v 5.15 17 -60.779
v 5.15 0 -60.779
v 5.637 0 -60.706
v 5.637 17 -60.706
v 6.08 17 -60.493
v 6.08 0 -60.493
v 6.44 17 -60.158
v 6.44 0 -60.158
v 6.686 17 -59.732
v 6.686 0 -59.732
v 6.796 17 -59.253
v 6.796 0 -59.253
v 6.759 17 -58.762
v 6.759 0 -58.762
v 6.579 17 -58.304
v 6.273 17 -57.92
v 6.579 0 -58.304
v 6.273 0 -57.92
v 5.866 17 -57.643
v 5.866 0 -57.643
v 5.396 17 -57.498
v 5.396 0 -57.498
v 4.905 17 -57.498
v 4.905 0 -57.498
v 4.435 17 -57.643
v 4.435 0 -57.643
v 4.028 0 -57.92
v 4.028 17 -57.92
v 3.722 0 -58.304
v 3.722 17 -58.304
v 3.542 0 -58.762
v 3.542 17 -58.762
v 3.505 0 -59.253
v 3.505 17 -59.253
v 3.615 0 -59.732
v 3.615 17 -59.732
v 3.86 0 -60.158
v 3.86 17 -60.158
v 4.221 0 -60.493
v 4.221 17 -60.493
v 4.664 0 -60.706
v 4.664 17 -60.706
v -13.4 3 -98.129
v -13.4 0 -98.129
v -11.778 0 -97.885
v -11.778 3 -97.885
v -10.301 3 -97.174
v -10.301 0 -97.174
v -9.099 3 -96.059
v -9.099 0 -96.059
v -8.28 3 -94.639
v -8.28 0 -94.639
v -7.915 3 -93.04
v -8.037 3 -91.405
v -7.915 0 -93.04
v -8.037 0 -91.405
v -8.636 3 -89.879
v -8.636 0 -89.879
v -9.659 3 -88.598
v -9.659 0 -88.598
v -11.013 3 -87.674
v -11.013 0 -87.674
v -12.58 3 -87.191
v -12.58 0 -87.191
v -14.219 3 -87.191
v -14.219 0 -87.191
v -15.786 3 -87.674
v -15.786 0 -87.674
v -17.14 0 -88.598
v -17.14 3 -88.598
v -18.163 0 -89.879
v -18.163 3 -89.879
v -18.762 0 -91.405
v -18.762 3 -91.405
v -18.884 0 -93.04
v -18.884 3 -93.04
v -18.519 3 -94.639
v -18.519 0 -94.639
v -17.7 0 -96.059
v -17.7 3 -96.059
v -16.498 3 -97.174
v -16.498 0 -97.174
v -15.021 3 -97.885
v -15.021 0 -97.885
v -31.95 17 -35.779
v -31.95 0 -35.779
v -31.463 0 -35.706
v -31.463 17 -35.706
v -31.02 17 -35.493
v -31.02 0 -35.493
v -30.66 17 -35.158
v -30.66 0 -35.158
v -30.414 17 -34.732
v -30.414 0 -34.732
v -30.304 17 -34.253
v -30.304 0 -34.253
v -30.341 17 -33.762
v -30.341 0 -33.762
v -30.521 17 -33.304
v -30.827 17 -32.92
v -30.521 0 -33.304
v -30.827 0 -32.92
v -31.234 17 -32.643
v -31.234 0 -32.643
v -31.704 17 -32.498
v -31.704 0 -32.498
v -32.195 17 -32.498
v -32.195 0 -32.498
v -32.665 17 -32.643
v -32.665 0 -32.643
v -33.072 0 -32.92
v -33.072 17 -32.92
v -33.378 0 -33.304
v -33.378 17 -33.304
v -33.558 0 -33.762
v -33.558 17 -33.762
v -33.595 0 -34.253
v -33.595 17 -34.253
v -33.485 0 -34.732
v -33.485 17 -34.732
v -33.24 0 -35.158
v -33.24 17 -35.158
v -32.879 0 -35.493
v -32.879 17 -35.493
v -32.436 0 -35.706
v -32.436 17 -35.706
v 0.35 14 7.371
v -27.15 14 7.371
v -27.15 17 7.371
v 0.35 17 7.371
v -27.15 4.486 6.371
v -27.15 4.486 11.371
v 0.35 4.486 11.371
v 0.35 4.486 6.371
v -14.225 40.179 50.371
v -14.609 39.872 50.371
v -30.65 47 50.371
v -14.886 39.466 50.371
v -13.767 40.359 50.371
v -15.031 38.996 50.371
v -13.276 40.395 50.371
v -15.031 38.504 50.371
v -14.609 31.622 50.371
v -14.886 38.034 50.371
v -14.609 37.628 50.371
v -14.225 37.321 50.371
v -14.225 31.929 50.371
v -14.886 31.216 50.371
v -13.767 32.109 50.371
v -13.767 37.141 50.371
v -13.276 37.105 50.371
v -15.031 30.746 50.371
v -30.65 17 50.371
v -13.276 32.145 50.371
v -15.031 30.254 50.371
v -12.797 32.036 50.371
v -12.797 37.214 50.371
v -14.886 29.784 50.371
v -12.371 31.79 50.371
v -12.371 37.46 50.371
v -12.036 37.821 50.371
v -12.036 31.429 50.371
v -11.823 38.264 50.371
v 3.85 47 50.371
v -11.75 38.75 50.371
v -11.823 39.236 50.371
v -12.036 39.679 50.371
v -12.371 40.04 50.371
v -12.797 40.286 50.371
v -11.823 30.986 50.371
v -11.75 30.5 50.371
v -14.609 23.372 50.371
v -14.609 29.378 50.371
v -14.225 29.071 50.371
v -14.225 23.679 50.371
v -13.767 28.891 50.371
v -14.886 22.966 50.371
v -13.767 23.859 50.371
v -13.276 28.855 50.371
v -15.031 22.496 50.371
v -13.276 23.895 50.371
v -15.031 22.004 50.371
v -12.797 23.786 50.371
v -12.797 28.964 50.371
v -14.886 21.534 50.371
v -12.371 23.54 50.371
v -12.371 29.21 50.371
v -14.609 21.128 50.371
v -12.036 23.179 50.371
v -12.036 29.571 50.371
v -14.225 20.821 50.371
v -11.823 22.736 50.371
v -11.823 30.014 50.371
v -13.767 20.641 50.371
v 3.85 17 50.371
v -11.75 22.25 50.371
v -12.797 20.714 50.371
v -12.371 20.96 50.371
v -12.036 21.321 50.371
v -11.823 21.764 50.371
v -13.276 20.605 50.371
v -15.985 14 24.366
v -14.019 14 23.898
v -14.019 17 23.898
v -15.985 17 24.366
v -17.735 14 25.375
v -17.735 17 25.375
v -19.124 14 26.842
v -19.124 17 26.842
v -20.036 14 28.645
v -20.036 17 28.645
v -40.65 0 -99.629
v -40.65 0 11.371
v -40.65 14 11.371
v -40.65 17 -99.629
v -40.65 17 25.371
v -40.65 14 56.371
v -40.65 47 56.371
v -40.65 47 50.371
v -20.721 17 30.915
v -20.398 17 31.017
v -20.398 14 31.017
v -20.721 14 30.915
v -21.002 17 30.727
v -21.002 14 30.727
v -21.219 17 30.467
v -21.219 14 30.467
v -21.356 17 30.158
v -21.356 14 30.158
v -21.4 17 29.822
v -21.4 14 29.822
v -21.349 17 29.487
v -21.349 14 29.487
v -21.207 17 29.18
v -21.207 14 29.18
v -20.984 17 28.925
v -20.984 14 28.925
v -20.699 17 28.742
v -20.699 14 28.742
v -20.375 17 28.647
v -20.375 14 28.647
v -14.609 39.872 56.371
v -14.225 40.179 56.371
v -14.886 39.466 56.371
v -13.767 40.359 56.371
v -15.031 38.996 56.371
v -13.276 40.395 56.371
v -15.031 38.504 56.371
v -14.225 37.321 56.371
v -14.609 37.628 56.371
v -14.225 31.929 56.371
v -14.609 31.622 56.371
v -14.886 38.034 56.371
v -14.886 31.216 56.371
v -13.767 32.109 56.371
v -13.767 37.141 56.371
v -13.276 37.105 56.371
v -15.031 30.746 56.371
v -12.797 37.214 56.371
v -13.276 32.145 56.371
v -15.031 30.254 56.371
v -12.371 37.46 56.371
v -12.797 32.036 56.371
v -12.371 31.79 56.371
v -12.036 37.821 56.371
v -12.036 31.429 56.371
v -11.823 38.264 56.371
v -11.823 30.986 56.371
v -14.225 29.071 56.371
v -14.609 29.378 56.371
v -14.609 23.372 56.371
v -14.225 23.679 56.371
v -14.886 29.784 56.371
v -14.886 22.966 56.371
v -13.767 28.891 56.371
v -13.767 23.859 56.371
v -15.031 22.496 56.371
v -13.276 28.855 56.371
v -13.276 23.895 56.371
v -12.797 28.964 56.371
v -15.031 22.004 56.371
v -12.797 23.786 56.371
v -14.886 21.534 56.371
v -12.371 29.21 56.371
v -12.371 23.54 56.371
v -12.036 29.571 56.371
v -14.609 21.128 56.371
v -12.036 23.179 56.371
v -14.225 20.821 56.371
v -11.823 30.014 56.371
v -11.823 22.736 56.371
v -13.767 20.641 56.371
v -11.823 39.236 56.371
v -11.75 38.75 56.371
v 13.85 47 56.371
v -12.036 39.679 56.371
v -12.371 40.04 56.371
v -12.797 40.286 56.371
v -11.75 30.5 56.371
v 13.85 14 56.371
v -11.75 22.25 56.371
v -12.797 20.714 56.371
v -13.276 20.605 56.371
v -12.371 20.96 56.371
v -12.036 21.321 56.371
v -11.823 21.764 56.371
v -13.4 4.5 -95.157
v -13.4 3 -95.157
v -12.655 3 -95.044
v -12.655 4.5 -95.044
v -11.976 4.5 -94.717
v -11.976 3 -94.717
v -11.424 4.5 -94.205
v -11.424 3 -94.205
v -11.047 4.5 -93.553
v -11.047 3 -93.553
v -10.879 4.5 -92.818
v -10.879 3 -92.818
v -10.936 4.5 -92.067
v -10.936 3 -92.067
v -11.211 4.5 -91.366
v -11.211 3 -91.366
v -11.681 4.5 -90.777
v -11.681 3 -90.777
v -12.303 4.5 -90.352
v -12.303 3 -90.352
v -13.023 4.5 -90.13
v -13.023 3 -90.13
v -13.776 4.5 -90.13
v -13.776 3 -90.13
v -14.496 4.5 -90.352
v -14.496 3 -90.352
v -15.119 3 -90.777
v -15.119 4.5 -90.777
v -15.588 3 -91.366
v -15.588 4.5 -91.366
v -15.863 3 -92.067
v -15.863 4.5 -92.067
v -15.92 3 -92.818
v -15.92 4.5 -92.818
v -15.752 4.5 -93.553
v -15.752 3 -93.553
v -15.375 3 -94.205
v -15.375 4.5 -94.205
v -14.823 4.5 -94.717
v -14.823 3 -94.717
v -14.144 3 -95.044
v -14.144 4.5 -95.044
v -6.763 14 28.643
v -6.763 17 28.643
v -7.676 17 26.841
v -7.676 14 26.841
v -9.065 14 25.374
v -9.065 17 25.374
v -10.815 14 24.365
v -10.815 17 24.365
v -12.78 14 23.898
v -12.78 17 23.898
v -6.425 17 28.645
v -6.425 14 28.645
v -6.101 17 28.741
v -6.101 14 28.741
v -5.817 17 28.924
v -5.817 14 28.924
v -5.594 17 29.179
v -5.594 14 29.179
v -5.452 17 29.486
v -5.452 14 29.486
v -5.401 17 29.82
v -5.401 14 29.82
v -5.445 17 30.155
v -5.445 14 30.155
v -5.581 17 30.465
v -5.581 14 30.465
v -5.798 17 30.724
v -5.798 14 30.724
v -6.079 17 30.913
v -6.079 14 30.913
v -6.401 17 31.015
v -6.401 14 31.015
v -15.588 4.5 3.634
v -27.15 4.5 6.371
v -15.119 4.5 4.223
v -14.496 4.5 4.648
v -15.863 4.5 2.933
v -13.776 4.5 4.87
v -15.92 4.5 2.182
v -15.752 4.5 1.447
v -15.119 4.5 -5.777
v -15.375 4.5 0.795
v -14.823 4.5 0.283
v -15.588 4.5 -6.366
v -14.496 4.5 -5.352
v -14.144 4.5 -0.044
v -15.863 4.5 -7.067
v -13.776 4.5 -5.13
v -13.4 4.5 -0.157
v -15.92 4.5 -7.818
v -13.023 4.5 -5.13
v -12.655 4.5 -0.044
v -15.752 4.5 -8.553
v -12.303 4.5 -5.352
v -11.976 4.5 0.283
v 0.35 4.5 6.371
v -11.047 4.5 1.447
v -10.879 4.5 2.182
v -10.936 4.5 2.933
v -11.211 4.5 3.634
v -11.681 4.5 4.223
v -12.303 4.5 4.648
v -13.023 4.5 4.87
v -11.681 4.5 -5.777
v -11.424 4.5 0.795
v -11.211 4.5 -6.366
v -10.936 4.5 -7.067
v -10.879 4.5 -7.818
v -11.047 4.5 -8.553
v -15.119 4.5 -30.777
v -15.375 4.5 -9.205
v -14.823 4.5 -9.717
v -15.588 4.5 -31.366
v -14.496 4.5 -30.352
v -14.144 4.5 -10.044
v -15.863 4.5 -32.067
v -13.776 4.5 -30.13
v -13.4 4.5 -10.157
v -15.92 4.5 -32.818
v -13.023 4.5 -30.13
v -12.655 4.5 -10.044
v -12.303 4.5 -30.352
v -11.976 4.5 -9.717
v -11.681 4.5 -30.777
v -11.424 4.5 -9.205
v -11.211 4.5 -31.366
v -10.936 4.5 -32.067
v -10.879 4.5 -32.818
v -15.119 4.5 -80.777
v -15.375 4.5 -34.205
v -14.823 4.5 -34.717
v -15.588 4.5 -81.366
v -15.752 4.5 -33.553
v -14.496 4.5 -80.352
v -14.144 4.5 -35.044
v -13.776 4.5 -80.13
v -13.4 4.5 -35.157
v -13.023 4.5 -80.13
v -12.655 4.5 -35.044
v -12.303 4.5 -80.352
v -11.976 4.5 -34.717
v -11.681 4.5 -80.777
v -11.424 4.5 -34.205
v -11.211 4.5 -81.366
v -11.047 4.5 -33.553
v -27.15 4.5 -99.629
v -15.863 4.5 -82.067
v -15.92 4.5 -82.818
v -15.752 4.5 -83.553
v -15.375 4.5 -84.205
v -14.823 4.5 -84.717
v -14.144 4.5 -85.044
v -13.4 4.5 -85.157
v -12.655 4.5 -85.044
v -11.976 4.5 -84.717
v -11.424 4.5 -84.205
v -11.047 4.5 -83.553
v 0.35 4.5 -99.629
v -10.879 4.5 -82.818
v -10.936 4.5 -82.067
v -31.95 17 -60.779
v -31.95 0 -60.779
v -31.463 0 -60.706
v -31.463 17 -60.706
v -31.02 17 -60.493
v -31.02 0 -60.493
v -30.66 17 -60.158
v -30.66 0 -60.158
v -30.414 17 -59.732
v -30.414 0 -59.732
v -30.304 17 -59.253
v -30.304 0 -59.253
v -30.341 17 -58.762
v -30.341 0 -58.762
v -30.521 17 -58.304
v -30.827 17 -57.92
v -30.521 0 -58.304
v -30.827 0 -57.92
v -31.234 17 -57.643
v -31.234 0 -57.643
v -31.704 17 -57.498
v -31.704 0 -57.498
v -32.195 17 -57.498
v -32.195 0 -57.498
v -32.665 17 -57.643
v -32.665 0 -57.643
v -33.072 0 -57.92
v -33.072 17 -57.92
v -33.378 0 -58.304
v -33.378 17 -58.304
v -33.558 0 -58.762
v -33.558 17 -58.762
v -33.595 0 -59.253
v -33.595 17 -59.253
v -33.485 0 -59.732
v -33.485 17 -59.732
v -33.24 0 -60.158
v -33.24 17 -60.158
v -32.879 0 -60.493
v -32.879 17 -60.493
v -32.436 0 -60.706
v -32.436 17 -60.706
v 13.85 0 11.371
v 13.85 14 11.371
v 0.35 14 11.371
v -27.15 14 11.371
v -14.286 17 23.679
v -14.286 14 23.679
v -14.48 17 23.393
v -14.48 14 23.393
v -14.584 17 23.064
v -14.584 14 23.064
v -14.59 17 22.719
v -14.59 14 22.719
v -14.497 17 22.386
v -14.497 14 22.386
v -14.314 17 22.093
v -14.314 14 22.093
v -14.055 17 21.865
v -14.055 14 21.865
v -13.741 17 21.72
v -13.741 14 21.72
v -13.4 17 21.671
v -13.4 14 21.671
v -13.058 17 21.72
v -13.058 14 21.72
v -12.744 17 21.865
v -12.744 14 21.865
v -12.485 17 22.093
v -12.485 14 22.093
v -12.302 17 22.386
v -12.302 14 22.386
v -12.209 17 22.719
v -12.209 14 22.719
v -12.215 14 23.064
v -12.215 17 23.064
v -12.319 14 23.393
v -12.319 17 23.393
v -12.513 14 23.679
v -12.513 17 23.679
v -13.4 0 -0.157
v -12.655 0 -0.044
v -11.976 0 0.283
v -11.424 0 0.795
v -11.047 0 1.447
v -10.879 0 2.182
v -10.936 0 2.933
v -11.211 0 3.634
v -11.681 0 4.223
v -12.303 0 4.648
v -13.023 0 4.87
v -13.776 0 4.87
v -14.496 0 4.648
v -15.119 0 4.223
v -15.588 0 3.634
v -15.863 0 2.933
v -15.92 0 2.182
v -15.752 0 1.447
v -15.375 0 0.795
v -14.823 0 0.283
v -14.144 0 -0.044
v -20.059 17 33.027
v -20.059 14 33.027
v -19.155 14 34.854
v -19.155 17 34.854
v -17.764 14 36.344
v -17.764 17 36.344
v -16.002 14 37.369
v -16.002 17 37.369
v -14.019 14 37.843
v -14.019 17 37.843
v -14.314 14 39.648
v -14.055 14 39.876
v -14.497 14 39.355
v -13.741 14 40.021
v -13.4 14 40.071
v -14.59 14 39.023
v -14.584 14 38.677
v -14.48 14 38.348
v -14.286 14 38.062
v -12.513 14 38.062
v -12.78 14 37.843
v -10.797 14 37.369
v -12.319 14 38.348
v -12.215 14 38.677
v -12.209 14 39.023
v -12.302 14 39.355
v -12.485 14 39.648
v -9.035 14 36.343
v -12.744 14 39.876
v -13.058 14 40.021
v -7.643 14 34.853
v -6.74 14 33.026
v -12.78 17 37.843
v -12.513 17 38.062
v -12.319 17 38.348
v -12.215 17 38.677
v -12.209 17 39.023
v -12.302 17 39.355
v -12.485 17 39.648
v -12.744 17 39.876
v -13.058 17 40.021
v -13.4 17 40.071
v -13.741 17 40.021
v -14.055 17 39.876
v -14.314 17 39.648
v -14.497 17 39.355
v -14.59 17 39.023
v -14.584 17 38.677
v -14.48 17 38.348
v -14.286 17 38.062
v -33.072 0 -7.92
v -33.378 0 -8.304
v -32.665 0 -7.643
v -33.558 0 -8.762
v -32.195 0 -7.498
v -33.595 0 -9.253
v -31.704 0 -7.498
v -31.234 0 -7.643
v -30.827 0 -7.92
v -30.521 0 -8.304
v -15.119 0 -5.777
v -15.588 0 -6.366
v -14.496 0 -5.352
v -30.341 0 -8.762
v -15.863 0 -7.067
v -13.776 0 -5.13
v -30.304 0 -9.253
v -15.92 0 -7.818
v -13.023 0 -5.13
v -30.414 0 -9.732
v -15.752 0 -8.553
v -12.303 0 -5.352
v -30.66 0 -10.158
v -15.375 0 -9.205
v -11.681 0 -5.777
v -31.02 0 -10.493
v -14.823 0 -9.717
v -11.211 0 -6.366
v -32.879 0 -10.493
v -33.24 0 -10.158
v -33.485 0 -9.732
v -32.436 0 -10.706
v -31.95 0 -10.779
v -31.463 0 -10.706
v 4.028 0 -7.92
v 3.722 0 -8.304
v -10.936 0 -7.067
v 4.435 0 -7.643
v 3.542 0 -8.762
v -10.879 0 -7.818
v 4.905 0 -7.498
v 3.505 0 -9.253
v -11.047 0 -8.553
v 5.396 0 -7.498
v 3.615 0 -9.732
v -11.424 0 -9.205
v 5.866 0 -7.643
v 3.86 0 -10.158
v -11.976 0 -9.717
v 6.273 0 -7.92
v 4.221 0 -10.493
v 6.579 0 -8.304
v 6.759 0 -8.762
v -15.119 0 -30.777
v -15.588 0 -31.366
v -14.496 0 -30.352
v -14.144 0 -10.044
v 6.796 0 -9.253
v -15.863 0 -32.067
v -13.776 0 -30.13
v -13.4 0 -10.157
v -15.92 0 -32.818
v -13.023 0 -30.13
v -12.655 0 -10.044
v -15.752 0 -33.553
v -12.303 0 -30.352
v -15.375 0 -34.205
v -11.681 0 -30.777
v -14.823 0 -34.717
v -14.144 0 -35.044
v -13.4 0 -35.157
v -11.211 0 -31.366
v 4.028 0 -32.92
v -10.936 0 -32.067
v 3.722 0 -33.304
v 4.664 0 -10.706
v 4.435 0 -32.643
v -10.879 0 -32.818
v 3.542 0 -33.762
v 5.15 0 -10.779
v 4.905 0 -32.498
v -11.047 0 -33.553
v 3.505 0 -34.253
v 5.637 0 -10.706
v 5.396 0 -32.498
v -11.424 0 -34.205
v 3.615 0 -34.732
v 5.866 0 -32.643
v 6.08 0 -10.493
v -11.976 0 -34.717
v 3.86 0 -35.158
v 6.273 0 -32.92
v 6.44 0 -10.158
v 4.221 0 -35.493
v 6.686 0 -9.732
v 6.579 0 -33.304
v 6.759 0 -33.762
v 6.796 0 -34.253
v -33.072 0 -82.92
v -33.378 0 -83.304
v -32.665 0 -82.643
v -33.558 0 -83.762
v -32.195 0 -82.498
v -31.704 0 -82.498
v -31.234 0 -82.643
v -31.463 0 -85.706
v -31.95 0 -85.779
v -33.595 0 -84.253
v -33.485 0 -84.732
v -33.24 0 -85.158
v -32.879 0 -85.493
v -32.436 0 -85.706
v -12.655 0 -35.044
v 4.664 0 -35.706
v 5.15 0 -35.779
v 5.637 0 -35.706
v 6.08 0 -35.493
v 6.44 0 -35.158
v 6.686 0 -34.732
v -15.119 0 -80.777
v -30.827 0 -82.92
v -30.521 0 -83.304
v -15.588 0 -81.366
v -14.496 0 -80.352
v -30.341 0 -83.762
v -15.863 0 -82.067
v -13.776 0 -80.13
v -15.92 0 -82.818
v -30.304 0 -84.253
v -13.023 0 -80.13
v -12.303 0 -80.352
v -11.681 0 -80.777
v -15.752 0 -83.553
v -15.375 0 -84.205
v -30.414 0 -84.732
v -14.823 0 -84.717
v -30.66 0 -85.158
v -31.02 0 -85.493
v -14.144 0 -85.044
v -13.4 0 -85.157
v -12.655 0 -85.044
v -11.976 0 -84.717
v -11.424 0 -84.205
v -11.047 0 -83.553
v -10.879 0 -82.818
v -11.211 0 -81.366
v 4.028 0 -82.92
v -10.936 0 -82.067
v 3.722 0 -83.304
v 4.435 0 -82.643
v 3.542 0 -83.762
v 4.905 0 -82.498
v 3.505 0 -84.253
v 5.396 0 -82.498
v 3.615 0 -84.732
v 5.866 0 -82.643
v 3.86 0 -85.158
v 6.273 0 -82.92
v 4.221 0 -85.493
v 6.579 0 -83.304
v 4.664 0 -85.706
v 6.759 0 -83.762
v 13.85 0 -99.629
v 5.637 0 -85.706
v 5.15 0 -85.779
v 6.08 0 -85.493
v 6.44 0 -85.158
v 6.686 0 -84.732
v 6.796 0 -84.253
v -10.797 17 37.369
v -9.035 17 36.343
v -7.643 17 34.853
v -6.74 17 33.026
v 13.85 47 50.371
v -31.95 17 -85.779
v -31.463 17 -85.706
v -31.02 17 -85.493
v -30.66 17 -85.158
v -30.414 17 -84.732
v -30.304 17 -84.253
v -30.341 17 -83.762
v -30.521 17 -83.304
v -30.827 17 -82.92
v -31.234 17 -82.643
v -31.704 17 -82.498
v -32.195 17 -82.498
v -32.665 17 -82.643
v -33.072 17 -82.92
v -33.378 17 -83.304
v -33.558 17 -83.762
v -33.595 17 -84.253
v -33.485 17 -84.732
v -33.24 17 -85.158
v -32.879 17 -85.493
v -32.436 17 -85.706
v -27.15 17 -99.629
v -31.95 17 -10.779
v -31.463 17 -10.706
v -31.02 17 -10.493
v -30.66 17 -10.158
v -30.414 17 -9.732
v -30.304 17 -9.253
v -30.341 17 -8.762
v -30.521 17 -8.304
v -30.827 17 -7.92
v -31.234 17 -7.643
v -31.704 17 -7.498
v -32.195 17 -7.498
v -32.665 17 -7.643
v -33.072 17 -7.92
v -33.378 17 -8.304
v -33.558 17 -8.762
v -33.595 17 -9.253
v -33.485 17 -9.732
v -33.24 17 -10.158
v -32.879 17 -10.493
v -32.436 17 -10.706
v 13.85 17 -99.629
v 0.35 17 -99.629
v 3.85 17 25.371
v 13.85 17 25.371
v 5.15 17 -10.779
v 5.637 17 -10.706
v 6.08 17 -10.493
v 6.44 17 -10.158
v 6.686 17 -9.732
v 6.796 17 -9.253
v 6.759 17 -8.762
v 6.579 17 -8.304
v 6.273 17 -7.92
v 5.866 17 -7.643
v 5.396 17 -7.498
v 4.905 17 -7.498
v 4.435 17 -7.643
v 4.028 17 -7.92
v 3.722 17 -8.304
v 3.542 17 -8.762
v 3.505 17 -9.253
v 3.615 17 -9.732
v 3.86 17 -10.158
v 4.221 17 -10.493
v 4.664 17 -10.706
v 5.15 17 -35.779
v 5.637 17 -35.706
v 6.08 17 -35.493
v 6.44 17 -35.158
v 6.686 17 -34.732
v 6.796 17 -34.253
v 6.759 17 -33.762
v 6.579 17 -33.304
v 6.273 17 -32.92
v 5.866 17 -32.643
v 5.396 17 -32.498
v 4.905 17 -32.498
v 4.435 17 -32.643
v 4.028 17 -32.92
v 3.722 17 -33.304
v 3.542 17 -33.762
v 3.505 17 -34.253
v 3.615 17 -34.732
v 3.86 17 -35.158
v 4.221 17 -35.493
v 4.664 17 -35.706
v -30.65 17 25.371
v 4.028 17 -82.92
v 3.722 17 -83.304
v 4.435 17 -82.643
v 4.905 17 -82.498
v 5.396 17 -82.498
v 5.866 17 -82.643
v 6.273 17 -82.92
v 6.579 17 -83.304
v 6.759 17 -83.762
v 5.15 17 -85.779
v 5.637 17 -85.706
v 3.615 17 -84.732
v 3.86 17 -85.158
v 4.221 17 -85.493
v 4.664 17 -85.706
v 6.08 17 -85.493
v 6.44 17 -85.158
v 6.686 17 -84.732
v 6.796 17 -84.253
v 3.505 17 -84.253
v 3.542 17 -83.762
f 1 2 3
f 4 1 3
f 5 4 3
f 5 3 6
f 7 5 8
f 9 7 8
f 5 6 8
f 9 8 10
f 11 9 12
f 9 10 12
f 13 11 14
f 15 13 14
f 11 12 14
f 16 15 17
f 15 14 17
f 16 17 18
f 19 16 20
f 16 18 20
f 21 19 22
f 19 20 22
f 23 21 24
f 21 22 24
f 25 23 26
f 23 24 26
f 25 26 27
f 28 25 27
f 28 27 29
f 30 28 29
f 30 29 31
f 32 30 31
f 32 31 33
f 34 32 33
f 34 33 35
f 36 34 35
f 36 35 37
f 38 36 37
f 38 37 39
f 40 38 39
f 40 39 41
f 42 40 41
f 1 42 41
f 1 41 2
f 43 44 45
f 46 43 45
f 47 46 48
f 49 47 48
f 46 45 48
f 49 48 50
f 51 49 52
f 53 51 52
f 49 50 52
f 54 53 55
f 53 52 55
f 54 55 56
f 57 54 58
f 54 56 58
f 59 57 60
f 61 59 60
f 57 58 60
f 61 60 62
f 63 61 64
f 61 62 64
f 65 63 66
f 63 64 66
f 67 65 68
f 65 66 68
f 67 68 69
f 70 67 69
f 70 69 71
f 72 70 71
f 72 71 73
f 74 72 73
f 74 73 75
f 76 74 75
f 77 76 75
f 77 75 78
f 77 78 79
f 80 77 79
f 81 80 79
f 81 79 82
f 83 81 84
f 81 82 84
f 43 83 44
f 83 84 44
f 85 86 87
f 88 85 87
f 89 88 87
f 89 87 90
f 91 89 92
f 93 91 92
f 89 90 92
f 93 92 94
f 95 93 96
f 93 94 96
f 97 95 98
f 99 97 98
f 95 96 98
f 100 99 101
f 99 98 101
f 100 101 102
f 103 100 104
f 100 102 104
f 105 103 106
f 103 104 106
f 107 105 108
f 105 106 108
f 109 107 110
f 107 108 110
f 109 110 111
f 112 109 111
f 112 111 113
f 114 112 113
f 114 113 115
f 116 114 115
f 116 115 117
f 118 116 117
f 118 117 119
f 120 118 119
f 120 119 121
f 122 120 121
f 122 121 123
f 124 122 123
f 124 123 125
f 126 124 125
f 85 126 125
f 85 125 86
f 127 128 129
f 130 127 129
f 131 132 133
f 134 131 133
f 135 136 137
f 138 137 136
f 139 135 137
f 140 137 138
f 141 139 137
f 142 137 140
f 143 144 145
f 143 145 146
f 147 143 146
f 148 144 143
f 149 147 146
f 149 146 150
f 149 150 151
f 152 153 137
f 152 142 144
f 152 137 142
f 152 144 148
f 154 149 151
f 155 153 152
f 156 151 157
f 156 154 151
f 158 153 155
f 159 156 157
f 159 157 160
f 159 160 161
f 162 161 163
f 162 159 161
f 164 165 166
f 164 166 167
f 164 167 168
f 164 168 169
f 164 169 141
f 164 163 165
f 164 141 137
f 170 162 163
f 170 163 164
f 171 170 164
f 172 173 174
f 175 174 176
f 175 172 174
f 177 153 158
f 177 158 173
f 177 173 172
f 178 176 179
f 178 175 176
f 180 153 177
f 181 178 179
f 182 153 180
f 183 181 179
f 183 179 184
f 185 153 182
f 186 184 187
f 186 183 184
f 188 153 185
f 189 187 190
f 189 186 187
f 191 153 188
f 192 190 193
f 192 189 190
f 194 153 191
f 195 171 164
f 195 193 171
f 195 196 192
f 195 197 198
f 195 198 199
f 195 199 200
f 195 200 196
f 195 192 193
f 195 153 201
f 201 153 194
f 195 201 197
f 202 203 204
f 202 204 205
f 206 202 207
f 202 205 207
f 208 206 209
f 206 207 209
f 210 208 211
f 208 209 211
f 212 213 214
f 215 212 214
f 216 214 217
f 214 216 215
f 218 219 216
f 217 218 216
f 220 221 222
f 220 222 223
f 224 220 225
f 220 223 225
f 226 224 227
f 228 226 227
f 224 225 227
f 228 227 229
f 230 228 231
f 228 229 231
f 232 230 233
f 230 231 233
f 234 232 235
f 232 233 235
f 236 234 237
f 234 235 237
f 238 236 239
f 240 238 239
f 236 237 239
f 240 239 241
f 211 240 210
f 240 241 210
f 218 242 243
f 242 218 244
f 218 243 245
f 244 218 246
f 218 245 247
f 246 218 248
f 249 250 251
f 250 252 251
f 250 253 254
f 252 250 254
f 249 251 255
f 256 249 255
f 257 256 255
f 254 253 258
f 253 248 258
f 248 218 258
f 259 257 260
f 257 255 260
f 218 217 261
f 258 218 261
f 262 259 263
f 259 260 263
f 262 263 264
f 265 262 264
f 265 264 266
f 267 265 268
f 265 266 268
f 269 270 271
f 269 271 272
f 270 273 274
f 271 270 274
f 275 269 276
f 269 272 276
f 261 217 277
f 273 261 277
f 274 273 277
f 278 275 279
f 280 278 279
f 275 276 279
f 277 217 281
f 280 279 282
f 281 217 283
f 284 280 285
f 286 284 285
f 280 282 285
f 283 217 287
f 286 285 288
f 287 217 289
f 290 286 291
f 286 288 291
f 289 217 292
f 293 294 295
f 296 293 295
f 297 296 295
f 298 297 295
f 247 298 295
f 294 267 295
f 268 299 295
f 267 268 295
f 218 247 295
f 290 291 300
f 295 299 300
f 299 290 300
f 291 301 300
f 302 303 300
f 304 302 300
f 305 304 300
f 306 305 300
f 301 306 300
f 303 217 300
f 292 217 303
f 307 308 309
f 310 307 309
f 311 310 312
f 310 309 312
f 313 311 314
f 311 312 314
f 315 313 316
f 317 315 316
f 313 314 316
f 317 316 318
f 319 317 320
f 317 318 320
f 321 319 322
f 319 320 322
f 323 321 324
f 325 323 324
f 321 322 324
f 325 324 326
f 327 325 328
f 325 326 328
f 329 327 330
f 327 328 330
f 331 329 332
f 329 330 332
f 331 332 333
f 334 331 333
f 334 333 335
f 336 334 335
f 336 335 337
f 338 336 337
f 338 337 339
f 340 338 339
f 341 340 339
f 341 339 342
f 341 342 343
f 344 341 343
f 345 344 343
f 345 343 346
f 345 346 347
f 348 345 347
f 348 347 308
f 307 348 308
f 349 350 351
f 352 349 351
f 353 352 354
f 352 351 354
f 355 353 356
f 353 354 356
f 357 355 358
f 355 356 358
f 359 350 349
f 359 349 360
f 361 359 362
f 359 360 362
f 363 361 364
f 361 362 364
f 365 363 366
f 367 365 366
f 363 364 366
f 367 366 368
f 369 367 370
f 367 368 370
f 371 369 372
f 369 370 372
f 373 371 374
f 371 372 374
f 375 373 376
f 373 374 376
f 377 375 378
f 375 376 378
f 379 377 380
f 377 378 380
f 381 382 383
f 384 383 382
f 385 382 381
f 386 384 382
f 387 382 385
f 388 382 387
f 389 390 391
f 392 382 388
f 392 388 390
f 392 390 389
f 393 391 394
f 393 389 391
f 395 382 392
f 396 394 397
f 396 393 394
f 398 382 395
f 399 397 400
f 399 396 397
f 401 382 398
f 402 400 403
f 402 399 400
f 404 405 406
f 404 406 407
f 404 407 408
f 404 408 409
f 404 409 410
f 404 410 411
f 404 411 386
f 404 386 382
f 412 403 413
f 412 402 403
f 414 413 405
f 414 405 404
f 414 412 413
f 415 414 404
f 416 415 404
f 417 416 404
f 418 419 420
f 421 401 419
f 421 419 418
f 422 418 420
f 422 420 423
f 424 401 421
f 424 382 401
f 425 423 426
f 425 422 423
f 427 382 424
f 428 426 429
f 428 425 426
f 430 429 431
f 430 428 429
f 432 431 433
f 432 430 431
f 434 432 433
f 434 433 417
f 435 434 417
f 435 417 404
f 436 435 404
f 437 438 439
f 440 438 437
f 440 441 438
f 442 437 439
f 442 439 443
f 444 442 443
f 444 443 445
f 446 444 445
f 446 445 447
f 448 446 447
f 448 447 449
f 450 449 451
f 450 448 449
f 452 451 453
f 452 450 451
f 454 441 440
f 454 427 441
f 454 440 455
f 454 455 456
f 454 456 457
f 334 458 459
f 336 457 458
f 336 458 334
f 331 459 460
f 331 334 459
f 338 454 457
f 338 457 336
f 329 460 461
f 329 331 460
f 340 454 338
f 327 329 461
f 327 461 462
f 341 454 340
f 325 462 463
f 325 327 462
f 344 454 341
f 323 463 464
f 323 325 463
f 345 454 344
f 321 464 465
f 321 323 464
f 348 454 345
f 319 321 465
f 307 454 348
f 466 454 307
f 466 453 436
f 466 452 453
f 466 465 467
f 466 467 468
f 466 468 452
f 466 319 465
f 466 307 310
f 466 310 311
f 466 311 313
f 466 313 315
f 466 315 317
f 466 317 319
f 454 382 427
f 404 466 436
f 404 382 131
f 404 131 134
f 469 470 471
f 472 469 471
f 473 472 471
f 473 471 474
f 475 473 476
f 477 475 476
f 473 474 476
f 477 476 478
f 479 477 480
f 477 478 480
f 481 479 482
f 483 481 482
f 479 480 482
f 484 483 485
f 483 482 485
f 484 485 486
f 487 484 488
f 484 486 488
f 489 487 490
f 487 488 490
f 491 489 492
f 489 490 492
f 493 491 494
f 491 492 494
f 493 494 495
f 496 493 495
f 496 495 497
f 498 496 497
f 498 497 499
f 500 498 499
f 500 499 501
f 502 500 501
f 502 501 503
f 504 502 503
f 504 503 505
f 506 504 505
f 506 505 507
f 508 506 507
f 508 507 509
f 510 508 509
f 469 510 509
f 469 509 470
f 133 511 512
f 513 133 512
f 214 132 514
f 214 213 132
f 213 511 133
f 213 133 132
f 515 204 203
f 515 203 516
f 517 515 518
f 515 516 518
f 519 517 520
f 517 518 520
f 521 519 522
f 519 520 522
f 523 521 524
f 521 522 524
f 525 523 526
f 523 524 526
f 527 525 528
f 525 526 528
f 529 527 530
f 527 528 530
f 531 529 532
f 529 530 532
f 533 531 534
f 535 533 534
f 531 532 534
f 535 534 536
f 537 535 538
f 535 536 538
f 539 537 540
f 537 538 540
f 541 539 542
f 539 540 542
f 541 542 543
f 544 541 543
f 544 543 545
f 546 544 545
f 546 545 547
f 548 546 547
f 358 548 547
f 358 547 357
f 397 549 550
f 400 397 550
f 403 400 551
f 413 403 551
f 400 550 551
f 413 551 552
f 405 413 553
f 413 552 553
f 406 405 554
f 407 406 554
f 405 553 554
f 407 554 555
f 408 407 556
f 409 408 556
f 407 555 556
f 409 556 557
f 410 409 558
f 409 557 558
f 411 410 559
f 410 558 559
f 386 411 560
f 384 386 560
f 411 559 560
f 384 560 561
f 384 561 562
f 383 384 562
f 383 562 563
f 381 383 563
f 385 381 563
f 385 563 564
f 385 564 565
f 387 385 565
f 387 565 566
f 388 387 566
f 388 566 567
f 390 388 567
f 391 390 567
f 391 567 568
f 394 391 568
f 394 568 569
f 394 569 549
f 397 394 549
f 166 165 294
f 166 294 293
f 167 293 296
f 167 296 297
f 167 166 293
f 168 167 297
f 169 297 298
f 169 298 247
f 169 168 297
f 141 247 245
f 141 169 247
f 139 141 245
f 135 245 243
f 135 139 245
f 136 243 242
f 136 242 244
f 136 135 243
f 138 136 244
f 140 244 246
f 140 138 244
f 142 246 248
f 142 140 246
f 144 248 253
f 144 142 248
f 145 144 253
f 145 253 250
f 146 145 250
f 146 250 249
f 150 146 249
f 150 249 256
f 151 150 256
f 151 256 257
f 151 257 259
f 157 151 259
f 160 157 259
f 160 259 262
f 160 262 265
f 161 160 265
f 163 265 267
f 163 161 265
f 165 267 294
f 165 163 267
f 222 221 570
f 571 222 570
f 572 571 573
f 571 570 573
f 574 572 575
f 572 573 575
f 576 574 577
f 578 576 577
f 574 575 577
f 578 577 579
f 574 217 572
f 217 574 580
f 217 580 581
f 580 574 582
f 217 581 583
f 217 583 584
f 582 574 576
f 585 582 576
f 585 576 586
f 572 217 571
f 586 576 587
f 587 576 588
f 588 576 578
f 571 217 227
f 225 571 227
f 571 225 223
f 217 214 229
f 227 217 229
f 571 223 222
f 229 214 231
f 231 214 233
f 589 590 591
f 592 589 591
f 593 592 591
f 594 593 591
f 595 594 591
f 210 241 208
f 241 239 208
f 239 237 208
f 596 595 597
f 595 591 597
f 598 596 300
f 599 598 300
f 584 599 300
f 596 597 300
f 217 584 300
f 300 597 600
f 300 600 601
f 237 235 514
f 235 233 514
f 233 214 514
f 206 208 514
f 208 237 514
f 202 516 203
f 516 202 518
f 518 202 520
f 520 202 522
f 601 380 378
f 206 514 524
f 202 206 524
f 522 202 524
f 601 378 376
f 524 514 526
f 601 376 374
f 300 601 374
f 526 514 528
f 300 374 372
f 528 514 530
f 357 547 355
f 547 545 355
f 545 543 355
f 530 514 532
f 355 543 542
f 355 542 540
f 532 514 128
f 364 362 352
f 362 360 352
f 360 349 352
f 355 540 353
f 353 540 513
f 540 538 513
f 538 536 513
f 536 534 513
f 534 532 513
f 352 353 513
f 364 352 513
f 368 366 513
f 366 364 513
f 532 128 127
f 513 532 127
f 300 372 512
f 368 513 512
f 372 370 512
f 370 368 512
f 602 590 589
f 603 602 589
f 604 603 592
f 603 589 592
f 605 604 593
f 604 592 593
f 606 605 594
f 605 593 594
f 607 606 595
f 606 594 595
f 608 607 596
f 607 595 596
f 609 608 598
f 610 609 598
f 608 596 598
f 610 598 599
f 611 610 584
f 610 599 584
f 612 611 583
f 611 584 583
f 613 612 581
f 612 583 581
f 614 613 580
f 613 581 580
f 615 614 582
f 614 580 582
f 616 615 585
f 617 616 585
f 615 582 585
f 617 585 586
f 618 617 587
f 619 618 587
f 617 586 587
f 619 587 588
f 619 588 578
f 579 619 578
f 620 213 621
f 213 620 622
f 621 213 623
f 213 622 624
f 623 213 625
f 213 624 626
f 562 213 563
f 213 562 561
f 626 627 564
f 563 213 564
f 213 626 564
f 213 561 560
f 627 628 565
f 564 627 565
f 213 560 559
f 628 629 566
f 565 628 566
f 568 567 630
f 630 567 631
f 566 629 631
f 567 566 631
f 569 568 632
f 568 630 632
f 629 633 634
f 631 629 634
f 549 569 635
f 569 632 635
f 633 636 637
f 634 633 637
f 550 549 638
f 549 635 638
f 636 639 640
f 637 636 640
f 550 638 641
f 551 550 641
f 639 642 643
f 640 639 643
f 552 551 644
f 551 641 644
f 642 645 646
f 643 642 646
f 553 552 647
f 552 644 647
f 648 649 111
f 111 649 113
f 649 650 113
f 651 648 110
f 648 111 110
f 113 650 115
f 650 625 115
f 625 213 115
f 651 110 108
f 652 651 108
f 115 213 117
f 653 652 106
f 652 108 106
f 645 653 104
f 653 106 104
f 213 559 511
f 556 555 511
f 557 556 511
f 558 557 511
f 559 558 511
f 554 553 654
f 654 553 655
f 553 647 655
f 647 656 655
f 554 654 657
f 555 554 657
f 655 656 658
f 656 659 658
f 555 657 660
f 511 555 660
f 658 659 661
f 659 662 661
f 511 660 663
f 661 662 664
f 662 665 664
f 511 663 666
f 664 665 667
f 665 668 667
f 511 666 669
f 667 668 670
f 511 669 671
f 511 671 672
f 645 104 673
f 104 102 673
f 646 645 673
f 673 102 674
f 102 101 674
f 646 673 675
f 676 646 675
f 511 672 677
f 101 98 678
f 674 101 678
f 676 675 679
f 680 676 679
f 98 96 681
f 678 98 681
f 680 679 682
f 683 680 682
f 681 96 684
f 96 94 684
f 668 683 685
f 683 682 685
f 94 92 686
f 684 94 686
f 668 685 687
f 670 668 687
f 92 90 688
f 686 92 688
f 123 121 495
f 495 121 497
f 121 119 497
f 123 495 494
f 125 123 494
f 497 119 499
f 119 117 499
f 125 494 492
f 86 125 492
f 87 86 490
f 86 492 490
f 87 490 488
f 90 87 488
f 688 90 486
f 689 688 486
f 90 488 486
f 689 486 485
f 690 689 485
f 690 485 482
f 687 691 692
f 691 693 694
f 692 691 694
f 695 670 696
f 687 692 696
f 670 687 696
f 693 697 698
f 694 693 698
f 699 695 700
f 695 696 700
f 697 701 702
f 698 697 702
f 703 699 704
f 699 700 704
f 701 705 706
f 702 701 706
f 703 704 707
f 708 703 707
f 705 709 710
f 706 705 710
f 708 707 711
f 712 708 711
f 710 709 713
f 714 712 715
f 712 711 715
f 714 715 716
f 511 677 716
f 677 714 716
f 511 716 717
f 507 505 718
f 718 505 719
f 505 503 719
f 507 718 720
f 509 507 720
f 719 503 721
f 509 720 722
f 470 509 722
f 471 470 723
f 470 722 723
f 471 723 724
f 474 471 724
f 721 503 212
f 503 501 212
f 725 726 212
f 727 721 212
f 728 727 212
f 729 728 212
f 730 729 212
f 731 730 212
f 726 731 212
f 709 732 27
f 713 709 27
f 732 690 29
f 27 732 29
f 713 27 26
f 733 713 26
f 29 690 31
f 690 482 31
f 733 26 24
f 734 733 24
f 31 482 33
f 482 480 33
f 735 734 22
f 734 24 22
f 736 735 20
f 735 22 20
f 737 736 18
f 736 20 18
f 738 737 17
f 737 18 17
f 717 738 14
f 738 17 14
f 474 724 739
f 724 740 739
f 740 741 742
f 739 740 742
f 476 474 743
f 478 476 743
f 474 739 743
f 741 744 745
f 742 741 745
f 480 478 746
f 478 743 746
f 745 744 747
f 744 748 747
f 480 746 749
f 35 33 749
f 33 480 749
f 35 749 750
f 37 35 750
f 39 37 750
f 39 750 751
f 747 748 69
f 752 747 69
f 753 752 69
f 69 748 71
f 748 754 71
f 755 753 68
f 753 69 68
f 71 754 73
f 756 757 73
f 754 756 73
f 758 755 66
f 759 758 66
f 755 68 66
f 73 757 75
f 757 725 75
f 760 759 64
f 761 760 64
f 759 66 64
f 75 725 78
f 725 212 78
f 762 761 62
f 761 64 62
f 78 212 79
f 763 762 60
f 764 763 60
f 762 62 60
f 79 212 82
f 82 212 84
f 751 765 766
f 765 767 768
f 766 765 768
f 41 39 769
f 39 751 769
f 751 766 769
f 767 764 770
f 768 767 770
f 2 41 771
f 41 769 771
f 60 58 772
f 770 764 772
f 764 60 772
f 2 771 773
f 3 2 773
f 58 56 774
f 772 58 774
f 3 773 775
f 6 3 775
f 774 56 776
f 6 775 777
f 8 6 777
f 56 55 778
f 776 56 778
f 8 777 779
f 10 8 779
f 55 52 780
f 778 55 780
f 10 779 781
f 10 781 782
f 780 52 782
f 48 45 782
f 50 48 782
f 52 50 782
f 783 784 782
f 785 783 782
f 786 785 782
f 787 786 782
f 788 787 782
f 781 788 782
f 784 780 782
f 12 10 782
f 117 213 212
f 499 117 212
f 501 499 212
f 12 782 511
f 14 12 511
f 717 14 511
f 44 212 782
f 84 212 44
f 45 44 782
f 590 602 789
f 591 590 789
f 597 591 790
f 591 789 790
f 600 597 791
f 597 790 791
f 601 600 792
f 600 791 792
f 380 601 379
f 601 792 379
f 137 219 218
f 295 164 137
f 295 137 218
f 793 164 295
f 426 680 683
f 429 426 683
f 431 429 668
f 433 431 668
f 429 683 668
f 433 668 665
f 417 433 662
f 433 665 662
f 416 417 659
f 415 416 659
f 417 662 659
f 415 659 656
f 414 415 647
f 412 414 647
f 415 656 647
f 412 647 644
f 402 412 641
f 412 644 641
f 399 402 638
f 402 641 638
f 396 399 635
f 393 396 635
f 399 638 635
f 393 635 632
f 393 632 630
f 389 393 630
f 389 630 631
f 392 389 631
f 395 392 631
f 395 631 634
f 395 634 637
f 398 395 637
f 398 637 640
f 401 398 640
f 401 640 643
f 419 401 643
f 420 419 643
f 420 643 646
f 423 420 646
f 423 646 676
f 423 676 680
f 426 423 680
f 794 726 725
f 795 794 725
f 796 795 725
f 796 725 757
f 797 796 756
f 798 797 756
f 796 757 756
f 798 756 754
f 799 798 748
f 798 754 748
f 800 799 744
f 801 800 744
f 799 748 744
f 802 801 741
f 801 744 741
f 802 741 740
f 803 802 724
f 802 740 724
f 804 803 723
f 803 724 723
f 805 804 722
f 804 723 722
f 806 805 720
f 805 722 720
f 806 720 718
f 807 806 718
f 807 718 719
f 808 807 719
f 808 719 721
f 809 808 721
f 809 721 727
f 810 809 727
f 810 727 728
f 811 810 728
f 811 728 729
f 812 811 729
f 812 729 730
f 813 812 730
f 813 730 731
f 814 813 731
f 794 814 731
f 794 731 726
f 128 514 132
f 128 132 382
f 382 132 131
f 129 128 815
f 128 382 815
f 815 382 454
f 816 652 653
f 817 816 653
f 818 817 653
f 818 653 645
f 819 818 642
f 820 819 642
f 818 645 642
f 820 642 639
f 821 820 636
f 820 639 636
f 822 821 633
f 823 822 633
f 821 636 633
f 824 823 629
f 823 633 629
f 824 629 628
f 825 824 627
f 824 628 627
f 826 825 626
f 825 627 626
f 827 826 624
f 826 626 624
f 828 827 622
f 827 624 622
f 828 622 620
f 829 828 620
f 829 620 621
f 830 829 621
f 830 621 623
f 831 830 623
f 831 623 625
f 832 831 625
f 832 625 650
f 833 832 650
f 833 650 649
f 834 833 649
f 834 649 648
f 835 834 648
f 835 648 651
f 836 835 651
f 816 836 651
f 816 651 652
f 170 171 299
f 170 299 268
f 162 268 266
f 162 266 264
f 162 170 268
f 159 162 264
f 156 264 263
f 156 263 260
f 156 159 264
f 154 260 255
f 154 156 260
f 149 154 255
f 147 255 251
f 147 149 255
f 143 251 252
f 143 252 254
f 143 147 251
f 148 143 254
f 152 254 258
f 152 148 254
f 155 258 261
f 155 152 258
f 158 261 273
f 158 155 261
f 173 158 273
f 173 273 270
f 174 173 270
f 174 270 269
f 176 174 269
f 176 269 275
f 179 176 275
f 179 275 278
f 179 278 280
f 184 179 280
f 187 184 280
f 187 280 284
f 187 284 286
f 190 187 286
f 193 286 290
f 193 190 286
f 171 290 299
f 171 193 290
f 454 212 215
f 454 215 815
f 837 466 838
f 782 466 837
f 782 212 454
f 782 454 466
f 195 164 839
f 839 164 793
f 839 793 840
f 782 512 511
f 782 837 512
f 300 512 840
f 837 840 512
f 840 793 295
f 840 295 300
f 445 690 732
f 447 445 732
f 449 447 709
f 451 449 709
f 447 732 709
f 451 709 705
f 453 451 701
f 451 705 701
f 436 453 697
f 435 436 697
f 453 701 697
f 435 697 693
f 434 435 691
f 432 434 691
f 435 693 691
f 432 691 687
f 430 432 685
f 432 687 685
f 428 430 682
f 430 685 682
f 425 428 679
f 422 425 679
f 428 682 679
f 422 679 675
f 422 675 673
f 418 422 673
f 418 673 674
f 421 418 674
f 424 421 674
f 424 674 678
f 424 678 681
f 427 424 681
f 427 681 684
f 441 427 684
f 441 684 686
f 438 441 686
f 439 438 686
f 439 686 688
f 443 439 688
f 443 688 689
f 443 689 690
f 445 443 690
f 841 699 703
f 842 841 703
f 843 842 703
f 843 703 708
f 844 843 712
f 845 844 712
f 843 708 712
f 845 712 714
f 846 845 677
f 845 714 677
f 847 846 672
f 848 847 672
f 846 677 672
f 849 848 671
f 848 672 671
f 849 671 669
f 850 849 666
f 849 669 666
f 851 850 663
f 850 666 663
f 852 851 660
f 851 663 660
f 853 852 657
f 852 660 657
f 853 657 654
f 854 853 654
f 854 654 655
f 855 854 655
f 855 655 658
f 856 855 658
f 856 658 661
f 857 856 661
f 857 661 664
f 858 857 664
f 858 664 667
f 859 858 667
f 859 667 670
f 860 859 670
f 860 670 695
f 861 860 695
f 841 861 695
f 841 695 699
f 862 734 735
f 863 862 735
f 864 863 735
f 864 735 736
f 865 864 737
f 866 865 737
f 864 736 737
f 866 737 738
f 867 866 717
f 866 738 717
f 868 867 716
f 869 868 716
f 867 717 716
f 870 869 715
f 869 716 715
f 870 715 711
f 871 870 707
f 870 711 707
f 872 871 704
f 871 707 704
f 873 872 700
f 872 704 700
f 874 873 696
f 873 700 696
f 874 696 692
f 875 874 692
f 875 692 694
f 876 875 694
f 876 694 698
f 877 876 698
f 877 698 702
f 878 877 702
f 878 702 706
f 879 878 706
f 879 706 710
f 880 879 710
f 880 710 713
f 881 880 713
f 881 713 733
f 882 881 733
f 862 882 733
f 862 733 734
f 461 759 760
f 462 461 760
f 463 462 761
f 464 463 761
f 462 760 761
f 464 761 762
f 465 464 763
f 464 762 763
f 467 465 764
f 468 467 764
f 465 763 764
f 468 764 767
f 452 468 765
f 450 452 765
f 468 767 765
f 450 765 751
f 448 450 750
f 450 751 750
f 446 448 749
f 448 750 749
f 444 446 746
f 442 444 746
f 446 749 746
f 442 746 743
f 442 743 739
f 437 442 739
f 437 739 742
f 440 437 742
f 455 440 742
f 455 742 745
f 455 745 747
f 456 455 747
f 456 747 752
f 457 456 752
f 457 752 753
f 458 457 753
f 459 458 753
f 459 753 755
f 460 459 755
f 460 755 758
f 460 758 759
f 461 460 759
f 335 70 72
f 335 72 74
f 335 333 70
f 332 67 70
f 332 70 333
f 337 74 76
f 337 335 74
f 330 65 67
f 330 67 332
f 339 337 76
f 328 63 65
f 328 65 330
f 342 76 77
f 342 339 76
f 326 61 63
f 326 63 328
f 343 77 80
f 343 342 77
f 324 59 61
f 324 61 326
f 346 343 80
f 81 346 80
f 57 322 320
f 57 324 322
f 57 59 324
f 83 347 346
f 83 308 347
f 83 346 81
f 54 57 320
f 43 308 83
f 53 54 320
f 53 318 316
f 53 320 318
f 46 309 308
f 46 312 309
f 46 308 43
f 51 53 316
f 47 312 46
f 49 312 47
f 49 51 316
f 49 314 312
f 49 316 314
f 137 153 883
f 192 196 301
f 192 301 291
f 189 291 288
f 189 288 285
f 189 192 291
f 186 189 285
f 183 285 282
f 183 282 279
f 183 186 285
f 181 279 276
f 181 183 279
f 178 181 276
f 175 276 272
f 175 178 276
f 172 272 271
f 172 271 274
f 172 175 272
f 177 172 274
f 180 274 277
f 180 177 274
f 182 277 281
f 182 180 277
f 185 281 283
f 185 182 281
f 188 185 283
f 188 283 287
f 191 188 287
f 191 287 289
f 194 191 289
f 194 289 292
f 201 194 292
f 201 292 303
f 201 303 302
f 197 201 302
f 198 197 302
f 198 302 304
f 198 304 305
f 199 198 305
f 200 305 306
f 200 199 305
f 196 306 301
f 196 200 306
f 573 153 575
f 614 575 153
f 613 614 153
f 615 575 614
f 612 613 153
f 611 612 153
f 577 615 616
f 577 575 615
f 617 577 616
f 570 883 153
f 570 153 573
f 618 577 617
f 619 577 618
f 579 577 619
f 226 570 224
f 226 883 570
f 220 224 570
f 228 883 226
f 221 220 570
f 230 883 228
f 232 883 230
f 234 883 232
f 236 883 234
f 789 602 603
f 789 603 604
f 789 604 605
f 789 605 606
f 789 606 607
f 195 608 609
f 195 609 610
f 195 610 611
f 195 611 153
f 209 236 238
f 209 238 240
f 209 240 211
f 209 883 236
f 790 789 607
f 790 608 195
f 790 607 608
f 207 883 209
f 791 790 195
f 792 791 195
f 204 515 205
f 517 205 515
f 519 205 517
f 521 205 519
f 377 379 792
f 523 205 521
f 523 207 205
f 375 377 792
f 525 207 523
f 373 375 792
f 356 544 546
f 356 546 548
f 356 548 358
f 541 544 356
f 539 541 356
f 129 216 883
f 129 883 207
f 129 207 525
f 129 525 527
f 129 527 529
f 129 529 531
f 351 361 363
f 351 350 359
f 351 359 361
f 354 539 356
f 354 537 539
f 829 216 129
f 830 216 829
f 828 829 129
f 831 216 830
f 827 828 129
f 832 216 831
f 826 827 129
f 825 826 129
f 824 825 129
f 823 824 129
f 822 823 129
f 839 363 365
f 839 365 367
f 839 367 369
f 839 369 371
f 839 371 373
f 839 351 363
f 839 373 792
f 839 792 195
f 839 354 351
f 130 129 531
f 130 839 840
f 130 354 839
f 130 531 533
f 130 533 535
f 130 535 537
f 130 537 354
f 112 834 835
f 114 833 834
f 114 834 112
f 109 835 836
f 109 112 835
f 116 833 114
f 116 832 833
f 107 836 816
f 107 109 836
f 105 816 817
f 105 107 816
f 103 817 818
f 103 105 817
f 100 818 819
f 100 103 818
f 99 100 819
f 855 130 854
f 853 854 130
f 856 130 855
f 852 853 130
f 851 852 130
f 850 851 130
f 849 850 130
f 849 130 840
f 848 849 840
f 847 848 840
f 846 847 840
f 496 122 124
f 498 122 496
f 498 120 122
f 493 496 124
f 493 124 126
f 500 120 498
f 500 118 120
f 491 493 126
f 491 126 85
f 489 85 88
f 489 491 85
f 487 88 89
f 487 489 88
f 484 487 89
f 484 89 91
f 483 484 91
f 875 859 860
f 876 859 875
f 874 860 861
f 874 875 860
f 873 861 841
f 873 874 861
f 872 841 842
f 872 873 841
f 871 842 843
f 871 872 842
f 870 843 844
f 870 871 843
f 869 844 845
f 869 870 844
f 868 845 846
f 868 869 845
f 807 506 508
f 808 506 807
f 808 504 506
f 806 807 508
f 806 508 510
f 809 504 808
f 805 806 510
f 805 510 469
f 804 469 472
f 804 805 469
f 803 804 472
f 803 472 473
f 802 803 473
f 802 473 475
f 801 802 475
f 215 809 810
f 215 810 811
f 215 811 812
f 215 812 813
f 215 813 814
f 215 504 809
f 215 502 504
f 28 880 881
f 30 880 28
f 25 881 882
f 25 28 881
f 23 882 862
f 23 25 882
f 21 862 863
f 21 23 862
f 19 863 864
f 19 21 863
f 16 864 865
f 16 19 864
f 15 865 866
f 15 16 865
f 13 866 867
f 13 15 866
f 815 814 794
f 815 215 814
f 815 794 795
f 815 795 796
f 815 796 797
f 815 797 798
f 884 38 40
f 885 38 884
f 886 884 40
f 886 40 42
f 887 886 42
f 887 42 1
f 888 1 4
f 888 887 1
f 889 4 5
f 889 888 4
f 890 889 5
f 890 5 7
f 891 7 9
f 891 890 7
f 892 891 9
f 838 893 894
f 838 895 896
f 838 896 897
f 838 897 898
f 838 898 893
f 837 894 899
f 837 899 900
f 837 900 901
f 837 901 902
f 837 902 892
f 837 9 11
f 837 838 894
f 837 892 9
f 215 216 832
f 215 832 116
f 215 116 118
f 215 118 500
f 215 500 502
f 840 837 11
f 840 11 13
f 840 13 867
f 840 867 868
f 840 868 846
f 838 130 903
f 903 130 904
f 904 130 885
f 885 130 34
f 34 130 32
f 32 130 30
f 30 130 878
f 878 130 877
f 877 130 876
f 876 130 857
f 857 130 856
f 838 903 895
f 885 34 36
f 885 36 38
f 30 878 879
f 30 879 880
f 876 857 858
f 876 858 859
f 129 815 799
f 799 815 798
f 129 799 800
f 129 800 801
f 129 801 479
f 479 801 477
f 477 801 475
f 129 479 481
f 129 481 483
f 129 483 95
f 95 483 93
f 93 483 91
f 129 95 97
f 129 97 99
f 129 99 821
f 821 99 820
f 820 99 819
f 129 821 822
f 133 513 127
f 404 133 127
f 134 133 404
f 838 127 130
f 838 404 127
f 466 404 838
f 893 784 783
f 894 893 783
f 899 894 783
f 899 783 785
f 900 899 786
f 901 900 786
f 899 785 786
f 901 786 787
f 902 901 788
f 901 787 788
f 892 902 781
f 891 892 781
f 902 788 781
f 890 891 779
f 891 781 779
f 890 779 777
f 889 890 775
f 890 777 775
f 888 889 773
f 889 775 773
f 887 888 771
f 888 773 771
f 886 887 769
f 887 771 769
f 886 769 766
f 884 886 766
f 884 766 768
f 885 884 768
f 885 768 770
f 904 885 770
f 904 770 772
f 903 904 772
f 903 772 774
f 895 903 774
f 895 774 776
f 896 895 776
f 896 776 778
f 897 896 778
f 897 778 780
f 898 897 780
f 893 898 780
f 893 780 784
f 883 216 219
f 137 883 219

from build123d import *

# Parameters (mm, degrees)
SKETCH1_W                           = 54.5
SKETCH1_H                           = 111
BOSS_EXTRUDE1_DEPTH                 = 4.5
SKETCH2_W                           = 13.5
SKETCH2_H                           = 111
BOSS_EXTRUDE2_DEPTH                 = 12.5
M4X0_7_TAPPED_HOLE1_D               = 3.3
SKETCH6_W                           = 4
SKETCH6_H                           = 12.5
BOSS_EXTRUDE3_DEPTH                 = 37
SKETCH7_W                           = 54.5
SKETCH7_H                           = 3
BOSS_EXTRUDE5_DEPTH                 = 45
SKETCH8_R                           = 7
CUT_EXTRUDE1_DEPTH                  = 3
M2_CLEARANCE_HOLE1_D                = 2.4
F_8_0_199_DIAMETER_HOLE1_D          = 5.0546
SKETCH12_R                          = 5.5
CUT_EXTRUDE3_DEPTH                  = 3
SKETCH13_W                          = 27.5
SKETCH13_H                          = 9.513667368
CUT_EXTRUDE4_DEPTH                  = 5
SKETCH14_W                          = 54.5
SKETCH14_H                          = 6
BOSS_EXTRUDE6_DEPTH                 = 30
RIB6_REACH                          = 124.903
SKETCH20_WALL_W                     = 286.858082508
SKETCH20_WALL_H                     = 10
TAP_START                           = 50.370687416
TAP_DRILL_FOR_M4X0_7_TAP1_OUTLINE_R = 1.65
TAP_DRILL_FOR_M4X0_7_TAP1_DEPTH     = 6
TAP_START_2                         = -40.649543841
TAP_DRILL_FOR_M4X0_7_TAP1_2_DEPTH   = 10


with BuildPart() as part:
    # Sketch1 → Boss-Extrude1 (new body)
    with BuildSketch(Plane(origin=(0, 0, 0), x_dir=(1, 0, 0), z_dir=(0, 1, 0))):
        with Locations((-13.399543841, 44.129312584)):
            Rectangle(SKETCH1_W, SKETCH1_H)
    extrude(amount=BOSS_EXTRUDE1_DEPTH)

    # Sketch2 → Boss-Extrude2 (add)
    with BuildSketch(Plane(origin=(0, 4.5, 0), x_dir=(1, 0, 0), z_dir=(0, 1, 0))):
        with Locations((7.100456159, 44.129312584)):
            Rectangle(SKETCH2_W, SKETCH2_H)
        with Locations((-33.899543841, 44.129312584)):
            Rectangle(SKETCH2_W, SKETCH2_H)
    extrude(amount=BOSS_EXTRUDE2_DEPTH)

    # M4x0.7 Tapped Hole1 (through all)
    with Locations(Plane(origin=(-31.949543841, 17, -9.129312584), x_dir=(0, 0, 1), z_dir=(0, 1, 0))):
        with Locations((0, 0), (-25, 0), (-50, 0), (-75, 0), (0, 37.1), (-25, 37.1), (-50, 37.1), (-75, 37.1)):
            Hole(M4X0_7_TAPPED_HOLE1_D / 2)

    # Sketch6 → Boss-Extrude3 (add)
    with BuildSketch(Plane(origin=(-27.149543841, 0, 0), x_dir=(0, 0, -1), z_dir=(1, 0, 0))):
        with Locations((-9.370687416, 10.75)):
            Rectangle(SKETCH6_W, SKETCH6_H)
    extrude(amount=BOSS_EXTRUDE3_DEPTH)

    # Sketch7 → Boss-Extrude5 (add)
    with BuildSketch(Plane.XY.offset(11.370687416)):
        with Locations((-13.399543841, 15.5)):
            Rectangle(SKETCH7_W, SKETCH7_H)
    extrude(amount=BOSS_EXTRUDE5_DEPTH)

    # Sketch8 → Cut-Extrude1 (cut)
    with BuildSketch(Plane(origin=(0, 17, 0), x_dir=(1, 0, 0), z_dir=(0, 1, 0))):
        with Locations(Location((-13.399543841, -30.870687416, 0), (0, 0, 270))):
            Circle(SKETCH8_R)
    extrude(amount=-CUT_EXTRUDE1_DEPTH, mode=Mode.SUBTRACT)

    # M2 Clearance Hole1 (through all)
    with Locations(Plane(origin=(-20.200285158, 17, 29.83376219), x_dir=(0, 0, 1), z_dir=(0, 1, 0))):
        with Locations((0, 0), (-6.963074774, 6.800741317), (9.036925226, 6.800741317), (-0.001679632, 13.599250141)):
            Hole(M2_CLEARANCE_HOLE1_D / 2)

    # #8 (0.199) Diameter Hole1 (through all)
    with Locations(Plane(origin=(-13.399543841, 4.5, 2.370687416), x_dir=(0, 0, 1), z_dir=(0, 1, 0))):
        with Locations((0, 0), (-10, 0), (-35, 0), (-85, 0), (-95, 0)):
            Hole(F_8_0_199_DIAMETER_HOLE1_D / 2)

    # Sketch12 → Cut-Extrude3 (cut)
    with BuildSketch(Plane(origin=(0, 0, 0), x_dir=(-1, 0, 0), z_dir=(0, -1, 0))):
        with Locations(Location((13.399543841, 92.629312584, 0), (0, 0, 90))):
            Circle(SKETCH12_R)
    extrude(amount=-CUT_EXTRUDE3_DEPTH, mode=Mode.SUBTRACT)

    # Sketch13 → Cut-Extrude4 (cut)
    with BuildSketch(Plane.XY.offset(11.370687416)):
        with Locations((-13.399543841, 9.243166316)):
            Rectangle(SKETCH13_W, SKETCH13_H)
    extrude(amount=-CUT_EXTRUDE4_DEPTH, mode=Mode.SUBTRACT)

    # Sketch14 → Boss-Extrude6 (add)
    with BuildSketch(Plane(origin=(0, 17, 0), x_dir=(1, 0, 0), z_dir=(0, 1, 0))):
        with Locations((-13.399543841, -53.370687416)):
            Rectangle(SKETCH14_W, SKETCH14_H)
    extrude(amount=BOSS_EXTRUDE6_DEPTH)

    # Sketch20 wall → Rib6 (add, up to next)
    with BuildSketch(Plane(origin=(13.850456159, 32, 37.870687416), x_dir=(0, -0.768221279597, -0.640184399664), z_dir=(0, 0.640184399664, -0.768221279597)), mode=Mode.PRIVATE) as rib6_sk1:
        with Locations((0, 5)):
            Rectangle(SKETCH20_WALL_W, SKETCH20_WALL_H)
    rib6_tool1 = extrude(rib6_sk1.sketch, amount=-RIB6_REACH, mode=Mode.PRIVATE) - part.part
    add(rib6_tool1.solids().sort_by_distance((13.850456159, 32, 37.870687416))[0])

    # Tap Drill for M4x0.7 Tap1: read off the stored shape, not the designer's step
    # Tap Drill for M4x0.7 Tap1 outline → Tap Drill for M4x0.7 Tap1 (cut)
    with BuildSketch(Plane.XY.offset(TAP_START)):
        with Locations((-13.399543841, 30.5)):
            Circle(TAP_DRILL_FOR_M4X0_7_TAP1_OUTLINE_R)
        with Locations((-13.399543841, 38.75)):
            Circle(TAP_DRILL_FOR_M4X0_7_TAP1_OUTLINE_R)
        with Locations((-13.399543841, 22.25)):
            Circle(TAP_DRILL_FOR_M4X0_7_TAP1_OUTLINE_R)
    extrude(amount=TAP_DRILL_FOR_M4X0_7_TAP1_DEPTH, mode=Mode.SUBTRACT)

    # Tap Drill for M4x0.7 Tap1 2 outline → Tap Drill for M4x0.7 Tap1 2 (add)
    with BuildSketch(Plane.YZ.offset(TAP_START_2)):
        Polygon((17, 50.370687416), (17, 25.370687416), (47, 50.370687416), align=None)
    extrude(amount=TAP_DRILL_FOR_M4X0_7_TAP1_2_DEPTH)


solid = part.part
